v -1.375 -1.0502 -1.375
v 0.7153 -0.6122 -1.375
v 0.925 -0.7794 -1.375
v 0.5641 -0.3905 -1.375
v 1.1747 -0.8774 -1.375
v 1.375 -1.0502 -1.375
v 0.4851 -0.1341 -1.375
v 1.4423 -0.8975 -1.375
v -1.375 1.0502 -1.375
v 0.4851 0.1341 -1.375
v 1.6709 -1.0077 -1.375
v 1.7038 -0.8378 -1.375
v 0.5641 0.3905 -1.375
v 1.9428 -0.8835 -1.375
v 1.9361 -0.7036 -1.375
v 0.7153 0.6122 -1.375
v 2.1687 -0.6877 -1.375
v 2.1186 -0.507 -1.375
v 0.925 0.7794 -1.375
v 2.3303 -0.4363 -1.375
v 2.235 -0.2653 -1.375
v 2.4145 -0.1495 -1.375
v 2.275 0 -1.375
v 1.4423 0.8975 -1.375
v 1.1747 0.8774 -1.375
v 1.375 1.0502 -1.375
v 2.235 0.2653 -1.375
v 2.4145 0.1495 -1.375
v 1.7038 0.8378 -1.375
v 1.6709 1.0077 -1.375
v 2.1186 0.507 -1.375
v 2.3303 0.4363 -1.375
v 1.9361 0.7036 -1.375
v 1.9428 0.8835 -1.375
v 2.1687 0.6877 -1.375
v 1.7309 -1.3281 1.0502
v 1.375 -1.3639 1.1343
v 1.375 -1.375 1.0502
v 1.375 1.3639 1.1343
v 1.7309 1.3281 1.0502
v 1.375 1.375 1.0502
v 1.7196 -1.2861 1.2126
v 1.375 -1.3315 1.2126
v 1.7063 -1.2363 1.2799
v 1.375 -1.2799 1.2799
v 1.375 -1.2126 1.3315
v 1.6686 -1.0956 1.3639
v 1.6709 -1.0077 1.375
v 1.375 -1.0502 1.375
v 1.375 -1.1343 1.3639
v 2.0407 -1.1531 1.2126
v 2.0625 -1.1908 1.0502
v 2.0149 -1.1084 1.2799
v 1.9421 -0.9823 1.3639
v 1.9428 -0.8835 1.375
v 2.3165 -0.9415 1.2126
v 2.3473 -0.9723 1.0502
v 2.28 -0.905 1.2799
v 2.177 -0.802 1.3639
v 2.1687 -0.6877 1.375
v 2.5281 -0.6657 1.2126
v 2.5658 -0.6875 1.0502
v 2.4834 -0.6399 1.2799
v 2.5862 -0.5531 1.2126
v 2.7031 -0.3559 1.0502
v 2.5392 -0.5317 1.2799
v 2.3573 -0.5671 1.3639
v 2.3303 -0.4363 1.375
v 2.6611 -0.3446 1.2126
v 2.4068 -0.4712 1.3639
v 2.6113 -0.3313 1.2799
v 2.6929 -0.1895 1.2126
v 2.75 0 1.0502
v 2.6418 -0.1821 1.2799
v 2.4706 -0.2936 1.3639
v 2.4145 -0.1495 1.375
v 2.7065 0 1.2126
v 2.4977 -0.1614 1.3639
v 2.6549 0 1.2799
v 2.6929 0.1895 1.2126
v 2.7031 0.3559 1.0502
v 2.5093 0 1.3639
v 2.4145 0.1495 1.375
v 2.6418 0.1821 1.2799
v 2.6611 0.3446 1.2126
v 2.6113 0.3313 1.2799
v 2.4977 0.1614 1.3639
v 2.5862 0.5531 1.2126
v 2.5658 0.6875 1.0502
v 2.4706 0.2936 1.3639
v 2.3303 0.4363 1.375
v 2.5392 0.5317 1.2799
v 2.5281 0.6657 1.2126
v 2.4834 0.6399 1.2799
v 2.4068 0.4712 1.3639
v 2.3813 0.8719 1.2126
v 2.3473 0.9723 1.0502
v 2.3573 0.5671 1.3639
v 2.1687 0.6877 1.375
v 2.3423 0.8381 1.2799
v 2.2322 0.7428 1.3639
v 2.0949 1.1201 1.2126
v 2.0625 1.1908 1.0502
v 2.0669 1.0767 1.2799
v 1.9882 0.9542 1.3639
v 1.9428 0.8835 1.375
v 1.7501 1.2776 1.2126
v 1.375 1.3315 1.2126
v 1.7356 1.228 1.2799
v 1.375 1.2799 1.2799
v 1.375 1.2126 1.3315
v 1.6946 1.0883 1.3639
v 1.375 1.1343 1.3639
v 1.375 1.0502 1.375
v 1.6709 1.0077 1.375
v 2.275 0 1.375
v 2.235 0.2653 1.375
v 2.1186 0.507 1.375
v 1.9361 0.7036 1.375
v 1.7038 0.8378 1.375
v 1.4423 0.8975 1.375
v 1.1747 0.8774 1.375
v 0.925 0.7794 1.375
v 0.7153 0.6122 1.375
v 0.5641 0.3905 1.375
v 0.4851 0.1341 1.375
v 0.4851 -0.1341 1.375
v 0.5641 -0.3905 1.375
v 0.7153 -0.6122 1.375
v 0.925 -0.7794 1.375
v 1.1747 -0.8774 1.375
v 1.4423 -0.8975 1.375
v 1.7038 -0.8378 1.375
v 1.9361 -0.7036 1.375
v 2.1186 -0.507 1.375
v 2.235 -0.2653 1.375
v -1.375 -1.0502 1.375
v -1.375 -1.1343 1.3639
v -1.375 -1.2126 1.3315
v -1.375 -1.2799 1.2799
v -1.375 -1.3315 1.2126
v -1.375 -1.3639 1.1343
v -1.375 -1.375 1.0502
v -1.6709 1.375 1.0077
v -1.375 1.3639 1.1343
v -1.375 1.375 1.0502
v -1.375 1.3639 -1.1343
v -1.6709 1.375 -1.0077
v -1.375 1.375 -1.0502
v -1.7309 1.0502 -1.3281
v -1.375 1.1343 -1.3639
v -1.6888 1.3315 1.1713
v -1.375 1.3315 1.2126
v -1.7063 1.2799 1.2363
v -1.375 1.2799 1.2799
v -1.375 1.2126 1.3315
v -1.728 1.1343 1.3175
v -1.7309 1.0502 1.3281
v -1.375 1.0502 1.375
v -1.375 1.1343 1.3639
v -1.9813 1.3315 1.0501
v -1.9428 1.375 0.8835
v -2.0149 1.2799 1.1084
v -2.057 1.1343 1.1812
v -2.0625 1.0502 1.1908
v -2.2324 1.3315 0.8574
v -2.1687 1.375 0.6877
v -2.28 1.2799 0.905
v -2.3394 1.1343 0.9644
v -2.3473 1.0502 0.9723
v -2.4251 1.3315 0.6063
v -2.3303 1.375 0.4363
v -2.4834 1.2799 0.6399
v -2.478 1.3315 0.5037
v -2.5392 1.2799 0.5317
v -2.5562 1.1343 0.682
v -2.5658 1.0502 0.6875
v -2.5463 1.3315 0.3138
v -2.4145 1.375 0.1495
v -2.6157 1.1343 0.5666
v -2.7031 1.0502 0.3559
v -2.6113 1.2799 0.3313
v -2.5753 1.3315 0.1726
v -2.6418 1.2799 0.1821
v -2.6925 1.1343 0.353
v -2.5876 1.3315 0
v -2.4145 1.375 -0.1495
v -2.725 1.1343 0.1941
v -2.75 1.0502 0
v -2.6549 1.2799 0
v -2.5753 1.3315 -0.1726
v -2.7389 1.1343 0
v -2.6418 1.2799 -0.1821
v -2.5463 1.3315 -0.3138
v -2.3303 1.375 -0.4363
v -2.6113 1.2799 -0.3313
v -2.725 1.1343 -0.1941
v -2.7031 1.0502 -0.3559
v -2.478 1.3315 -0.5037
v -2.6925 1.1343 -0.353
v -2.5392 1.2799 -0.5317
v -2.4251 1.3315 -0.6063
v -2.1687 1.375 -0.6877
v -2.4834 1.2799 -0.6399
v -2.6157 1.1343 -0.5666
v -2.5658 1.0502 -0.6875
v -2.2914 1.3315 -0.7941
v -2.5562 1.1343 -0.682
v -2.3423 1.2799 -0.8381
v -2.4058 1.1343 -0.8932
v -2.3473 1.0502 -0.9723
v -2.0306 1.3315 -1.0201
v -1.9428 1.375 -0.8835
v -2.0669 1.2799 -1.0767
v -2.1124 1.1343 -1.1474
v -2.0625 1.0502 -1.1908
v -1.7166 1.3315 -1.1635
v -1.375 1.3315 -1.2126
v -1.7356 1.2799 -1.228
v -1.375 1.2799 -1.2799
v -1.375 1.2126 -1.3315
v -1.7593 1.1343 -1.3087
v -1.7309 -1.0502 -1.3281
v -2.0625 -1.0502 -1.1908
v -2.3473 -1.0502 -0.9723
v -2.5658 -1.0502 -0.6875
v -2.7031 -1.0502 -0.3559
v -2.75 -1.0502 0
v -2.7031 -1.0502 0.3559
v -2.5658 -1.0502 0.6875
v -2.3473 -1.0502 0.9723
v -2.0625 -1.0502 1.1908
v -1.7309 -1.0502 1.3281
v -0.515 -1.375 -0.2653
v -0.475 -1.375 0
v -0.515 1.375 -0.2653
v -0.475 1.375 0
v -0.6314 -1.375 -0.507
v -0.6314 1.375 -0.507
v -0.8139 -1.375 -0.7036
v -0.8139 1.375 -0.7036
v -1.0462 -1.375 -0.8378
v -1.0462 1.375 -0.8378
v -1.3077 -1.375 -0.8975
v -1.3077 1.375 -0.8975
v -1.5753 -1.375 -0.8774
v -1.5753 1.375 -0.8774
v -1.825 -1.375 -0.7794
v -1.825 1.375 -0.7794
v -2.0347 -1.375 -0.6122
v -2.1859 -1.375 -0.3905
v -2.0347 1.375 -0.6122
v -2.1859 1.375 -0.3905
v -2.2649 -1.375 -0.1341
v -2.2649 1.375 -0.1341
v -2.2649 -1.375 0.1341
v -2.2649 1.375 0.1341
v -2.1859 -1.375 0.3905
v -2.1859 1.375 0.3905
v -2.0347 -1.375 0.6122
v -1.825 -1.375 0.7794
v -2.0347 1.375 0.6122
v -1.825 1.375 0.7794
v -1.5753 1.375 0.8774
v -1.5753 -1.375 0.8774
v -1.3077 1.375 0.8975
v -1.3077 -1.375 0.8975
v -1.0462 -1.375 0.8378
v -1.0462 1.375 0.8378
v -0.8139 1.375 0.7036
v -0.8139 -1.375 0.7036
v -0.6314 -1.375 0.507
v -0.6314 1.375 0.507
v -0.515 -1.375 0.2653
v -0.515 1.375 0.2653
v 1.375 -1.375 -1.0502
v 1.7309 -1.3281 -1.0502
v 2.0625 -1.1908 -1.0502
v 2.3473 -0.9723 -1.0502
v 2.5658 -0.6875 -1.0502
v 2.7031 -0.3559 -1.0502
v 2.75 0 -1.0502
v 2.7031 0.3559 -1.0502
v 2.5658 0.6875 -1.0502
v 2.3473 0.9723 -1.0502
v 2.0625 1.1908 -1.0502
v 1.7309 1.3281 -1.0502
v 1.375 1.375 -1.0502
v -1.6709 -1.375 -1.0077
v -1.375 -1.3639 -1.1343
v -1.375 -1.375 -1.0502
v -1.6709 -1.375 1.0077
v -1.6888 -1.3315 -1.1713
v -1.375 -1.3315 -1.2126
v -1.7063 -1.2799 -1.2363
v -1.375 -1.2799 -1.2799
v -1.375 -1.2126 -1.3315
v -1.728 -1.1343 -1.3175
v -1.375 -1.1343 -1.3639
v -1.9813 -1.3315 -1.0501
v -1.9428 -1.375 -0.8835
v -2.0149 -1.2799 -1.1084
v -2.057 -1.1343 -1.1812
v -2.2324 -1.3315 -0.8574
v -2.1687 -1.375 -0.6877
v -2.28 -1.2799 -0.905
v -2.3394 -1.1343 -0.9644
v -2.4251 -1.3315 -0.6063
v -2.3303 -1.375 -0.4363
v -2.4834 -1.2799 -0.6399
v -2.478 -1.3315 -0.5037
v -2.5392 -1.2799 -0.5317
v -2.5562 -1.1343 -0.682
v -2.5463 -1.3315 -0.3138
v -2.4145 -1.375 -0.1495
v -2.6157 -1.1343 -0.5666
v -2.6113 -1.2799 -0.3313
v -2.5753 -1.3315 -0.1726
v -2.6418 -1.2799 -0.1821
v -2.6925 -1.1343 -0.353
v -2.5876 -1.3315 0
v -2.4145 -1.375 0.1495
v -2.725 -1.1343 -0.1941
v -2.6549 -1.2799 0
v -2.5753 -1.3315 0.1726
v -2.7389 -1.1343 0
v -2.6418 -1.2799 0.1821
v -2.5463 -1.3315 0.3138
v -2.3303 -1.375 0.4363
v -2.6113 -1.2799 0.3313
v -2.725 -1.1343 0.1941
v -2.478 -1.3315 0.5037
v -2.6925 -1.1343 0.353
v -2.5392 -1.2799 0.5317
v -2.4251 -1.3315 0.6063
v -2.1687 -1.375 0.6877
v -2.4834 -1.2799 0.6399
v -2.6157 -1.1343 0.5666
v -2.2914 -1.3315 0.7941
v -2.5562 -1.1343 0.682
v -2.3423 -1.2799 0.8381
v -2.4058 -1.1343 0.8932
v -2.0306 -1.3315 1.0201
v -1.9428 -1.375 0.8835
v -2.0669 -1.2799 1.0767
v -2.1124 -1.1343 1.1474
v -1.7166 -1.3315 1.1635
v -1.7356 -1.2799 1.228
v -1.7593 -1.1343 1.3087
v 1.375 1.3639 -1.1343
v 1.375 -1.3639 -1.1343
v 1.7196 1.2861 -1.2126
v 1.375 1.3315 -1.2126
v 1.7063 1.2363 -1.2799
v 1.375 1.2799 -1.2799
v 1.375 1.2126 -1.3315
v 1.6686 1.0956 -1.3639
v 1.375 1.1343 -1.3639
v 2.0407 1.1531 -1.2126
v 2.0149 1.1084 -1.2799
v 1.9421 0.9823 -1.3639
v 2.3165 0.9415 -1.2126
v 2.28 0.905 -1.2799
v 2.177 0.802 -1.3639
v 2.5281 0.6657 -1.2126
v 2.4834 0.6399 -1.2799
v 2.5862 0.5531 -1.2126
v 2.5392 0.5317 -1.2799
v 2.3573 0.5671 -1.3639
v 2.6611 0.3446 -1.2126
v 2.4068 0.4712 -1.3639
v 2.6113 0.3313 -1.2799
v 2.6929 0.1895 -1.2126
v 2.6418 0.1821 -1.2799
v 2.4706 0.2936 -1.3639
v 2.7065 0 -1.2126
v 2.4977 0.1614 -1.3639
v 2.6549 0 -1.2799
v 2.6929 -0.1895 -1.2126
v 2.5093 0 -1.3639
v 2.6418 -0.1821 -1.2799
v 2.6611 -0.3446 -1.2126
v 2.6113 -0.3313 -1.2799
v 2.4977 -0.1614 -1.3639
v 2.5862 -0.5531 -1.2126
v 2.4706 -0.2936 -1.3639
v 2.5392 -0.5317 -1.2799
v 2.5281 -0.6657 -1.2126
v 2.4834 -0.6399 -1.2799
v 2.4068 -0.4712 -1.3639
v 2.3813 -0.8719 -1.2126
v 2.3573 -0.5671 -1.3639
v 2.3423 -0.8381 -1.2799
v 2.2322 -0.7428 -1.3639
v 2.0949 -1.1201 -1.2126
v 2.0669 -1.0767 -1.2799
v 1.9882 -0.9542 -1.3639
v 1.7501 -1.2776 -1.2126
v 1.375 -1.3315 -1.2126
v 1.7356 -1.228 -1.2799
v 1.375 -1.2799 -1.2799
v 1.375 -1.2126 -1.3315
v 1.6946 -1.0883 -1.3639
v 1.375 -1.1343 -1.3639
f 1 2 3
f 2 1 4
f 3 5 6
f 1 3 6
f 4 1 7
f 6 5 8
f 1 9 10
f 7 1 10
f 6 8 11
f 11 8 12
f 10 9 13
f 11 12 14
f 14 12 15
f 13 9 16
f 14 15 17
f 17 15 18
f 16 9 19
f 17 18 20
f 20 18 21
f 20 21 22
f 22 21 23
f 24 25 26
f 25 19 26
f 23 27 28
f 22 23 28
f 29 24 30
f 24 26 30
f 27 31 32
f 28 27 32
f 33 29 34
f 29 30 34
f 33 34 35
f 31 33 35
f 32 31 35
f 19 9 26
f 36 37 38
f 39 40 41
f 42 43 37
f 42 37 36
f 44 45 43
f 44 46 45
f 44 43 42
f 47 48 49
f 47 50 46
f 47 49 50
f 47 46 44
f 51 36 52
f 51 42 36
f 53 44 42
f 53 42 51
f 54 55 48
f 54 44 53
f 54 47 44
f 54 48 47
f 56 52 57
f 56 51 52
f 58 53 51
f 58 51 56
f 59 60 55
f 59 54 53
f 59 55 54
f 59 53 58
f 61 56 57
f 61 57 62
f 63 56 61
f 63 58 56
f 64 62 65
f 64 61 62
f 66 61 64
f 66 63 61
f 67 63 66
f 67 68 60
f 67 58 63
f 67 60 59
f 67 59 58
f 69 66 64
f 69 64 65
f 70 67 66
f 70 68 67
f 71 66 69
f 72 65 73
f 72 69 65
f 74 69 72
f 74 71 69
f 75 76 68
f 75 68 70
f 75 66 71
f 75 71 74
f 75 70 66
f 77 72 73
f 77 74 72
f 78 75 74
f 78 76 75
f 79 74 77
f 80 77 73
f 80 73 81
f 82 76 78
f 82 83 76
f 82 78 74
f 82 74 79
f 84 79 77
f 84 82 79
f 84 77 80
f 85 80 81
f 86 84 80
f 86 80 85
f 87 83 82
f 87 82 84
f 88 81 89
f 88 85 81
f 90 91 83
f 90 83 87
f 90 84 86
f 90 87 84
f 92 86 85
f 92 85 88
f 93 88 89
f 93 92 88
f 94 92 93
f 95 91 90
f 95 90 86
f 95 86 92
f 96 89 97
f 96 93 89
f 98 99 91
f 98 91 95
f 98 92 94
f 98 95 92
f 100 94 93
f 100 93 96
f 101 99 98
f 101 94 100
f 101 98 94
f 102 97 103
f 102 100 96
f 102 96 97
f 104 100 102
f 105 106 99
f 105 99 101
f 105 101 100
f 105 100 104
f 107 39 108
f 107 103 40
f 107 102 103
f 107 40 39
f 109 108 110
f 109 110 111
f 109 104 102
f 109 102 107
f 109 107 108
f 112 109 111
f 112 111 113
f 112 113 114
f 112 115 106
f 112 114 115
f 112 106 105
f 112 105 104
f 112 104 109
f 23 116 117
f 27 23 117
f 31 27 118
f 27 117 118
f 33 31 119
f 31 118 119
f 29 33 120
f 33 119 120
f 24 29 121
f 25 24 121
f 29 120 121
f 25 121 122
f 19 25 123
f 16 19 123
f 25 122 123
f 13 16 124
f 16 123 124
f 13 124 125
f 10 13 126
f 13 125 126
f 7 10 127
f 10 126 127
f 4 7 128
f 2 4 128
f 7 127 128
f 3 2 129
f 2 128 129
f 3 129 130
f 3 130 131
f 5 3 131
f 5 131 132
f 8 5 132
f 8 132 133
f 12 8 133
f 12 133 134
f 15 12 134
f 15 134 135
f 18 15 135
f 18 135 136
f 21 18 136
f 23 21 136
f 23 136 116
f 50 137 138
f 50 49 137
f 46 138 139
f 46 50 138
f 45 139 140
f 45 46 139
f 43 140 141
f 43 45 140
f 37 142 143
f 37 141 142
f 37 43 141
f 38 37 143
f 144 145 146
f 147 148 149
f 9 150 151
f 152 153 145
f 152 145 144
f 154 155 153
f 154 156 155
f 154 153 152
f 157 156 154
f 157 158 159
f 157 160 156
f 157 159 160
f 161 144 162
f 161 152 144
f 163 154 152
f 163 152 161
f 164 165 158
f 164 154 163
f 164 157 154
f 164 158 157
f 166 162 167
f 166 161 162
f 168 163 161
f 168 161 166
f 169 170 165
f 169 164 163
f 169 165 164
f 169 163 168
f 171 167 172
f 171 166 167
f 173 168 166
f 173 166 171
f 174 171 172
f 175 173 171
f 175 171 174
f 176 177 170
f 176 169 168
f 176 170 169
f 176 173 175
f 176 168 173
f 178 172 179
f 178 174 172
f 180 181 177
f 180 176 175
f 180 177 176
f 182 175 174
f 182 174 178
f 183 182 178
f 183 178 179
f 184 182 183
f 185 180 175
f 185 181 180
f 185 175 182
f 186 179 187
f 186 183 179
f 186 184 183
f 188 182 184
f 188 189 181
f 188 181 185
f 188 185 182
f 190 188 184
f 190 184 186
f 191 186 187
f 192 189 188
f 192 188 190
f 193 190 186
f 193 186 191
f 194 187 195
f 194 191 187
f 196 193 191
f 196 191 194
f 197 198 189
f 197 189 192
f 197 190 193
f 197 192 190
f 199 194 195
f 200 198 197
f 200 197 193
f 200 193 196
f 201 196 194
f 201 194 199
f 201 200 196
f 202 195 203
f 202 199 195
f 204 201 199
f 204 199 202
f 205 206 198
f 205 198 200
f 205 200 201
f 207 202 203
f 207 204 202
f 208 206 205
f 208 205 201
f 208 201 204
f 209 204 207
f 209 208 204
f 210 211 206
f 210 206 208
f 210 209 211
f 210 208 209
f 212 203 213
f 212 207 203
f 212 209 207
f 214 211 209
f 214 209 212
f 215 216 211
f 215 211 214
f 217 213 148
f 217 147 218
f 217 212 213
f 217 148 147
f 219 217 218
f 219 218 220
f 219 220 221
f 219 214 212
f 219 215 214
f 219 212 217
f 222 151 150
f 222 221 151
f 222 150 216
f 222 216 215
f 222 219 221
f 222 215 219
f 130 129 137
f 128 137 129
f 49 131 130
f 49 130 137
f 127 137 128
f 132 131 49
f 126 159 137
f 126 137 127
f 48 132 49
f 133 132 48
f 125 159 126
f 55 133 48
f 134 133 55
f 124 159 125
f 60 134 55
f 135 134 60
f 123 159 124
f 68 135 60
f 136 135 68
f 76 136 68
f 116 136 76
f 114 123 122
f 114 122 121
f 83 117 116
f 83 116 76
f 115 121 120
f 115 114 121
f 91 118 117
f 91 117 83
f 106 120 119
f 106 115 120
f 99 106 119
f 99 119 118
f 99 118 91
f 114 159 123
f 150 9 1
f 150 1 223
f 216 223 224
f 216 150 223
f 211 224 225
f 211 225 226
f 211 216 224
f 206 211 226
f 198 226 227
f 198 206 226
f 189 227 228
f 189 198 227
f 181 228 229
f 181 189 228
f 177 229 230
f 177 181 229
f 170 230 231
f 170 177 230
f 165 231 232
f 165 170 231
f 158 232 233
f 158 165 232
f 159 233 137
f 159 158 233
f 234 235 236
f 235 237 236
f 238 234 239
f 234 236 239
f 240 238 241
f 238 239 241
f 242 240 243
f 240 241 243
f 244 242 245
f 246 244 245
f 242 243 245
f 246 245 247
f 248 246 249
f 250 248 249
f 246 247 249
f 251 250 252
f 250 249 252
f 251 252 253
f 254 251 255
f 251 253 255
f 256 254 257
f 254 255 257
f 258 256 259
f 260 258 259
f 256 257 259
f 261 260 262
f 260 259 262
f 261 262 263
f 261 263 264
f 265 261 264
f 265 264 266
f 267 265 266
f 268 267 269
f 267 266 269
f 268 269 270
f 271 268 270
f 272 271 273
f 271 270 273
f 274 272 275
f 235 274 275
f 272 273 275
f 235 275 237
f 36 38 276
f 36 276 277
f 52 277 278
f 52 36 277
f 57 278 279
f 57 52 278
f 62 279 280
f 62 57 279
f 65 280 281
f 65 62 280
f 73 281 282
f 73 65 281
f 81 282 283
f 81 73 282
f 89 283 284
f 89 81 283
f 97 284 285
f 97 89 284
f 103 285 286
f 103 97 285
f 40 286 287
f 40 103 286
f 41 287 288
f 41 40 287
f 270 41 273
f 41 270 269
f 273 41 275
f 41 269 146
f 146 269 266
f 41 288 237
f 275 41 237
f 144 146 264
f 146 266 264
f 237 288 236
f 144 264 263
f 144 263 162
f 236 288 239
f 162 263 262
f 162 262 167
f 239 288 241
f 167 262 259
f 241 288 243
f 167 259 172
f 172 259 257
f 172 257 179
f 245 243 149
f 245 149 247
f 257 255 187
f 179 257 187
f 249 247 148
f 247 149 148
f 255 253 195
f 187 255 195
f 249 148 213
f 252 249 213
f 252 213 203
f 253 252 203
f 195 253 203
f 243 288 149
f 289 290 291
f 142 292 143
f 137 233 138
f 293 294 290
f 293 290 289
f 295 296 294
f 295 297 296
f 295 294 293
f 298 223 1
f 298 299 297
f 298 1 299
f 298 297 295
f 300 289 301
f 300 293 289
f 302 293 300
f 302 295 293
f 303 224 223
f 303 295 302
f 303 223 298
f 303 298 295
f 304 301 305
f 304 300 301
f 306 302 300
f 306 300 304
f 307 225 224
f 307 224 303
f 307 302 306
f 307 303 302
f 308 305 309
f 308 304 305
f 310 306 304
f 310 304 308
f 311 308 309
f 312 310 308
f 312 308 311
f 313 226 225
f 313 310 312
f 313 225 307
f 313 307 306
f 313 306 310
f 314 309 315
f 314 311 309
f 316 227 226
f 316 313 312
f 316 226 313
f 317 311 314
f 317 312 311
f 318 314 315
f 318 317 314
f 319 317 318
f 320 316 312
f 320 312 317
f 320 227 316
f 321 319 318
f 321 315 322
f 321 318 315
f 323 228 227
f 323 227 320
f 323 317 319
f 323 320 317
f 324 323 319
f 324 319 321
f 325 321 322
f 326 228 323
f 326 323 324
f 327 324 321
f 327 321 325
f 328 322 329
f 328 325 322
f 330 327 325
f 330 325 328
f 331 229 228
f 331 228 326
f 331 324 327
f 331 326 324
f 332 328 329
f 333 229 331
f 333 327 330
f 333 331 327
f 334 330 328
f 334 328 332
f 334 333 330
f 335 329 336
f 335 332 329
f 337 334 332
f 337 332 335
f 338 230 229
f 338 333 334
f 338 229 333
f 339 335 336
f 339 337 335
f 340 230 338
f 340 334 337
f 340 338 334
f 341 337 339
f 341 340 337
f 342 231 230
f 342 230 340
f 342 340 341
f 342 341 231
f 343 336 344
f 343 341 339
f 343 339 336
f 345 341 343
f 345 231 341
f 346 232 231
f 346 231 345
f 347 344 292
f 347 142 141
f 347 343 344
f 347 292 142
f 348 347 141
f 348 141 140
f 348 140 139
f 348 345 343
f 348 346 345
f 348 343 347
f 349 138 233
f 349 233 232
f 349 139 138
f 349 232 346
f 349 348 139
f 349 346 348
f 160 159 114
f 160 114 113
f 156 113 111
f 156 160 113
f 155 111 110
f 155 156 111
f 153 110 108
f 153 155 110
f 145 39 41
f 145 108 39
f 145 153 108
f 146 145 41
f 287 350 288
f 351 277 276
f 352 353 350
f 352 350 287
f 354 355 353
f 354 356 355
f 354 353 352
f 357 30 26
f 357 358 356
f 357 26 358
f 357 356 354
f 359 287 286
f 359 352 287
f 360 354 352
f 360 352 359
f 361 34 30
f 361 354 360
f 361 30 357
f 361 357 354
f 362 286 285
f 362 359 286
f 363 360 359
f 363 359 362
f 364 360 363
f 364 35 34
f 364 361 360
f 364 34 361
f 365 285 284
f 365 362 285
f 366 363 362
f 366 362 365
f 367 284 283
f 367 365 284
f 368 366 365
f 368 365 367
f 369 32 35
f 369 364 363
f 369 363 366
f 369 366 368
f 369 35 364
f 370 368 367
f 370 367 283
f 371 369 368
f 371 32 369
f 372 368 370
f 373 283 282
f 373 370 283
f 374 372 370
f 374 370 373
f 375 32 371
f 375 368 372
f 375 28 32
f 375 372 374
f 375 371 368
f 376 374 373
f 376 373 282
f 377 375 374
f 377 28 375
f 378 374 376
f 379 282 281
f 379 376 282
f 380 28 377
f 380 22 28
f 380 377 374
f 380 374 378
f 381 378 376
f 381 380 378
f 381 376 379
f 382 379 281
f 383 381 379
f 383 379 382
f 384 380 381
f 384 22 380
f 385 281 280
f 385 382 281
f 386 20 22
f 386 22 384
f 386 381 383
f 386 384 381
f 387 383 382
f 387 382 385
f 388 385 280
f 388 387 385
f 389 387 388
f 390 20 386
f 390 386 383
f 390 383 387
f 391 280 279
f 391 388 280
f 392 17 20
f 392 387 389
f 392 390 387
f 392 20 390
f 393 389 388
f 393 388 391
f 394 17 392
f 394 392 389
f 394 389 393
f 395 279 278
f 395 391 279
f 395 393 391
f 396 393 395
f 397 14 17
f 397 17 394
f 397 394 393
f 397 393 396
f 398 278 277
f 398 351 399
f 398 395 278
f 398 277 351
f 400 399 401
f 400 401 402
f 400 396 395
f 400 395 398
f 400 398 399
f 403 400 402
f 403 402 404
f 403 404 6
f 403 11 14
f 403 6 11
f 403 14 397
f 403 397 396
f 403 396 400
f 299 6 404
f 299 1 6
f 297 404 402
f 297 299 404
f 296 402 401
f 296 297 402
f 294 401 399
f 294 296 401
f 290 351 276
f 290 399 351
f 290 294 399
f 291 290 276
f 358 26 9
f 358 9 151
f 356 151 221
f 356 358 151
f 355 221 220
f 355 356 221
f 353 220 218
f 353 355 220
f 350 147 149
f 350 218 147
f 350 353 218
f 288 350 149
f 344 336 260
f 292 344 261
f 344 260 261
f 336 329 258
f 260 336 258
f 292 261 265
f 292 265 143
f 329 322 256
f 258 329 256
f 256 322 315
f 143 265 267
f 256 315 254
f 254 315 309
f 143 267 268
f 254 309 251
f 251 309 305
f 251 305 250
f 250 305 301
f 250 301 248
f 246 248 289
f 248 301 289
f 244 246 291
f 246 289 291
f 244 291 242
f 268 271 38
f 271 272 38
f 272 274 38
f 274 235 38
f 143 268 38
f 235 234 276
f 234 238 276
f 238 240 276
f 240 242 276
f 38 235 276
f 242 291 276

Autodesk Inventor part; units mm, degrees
ref_plane "YZ Plane" through (0, 0, 0) normal (1, 0, 0) x (0, 1, 0)
ref_plane "XZ Plane" through (0, 0, 0) normal (0, 1, 0) x (-1, 0, 0)
ref_plane "XY Plane" through (0, 0, 0) normal (0, 0, 1) x (1, 0, 0)
sketch "Sketch1" plane through (0, 0, 0) normal (0, 0, 1) x (1, 0, 0)
  line L0 (-2.75, -1.375) -> (2.75, -1.375)
  line L1 (2.75, -1.375) -> (2.75, 1.375)
  line L2 (2.75, 1.375) -> (-2.75, 1.375)
  line L3 (-2.75, 1.375) -> (-2.75, -1.375)
  line L4 (-2.75, -1.375) -> (2.75, 1.375) construction
  line L5 (2.75, -1.375) -> (-2.75, 1.375) construction
  point P0 (0, 0)
  dimension "d0" = 5.5
  dimension "d1" = 2.75
extrude "Extrusion1" add sketch "Sketch1" along normal mid plane 2.75
sketch "Sketch2" plane through (0, 0, 1.375) normal (0, 0, 1) x (1, 0, 0)
  circle A0 centre (1.375, 0) radius 1.375
  line L0 (2.75, 1.375) -> (-2.75, 1.375) projected
  line L1 (2.75, -1.375) -> (2.75, 1.375) projected
  line L2 (1.375, 0) -> (1.375, 1.375)
  line L3 (1.375, 1.375) -> (2.75, 1.375)
  line L4 (2.75, 1.375) -> (2.75, -1.375)
  line L5 (-2.75, -1.375) -> (2.75, -1.375) projected
  line L6 (2.75, -1.375) -> (1.375, -1.375)
  circle A1 centre (1.375, 0) radius 0.9
  point P0 (0, 0)
  point P1 (2.75, 0)
  dimension "d4" = 1.8
extrude "Extrusion2" cut sketch "Sketch2" against normal through all contours A1 | L1 L5 A0 | A0 L0 L1
sketch "Sketch3" plane through (-2.75, 1.375, 1.375) normal (0, 1, 0) x (1, 0, 0)
  line L0 (0, 2.75) -> (0, 0) projected
  line L1 (0, 1.375) -> (4.125, 1.375)
  line L2 (4.125, 2.75) -> (4.125, 0) projected
  circle A0 centre (1.375, 1.375) radius 1.375
  line L3 (0, 2.75) -> (4.125, 2.75) projected
  line L4 (0, 0) -> (0, 2.75) projected
  circle A1 centre (1.375, 1.375) radius 0.9
  line L5 (1.375, 1.375) -> (1.375, 0)
  line L6 (0, 0) -> (4.125, 0) projected
  line L7 (1.375, 0) -> (0, 0)
  line L8 (0, 0) -> (0, 2.75)
  line L9 (0, 2.75) -> (1.375, 2.75)
  point P0 (2.75, 1.375)
  dimension "d7" = 1.8
extrude "Extrusion3" cut sketch "Sketch3" against normal blind 2.75 contours L3 A0 L0 | A0 L6 L0 | A1 L1 | L1 L5 A1 | L1 A1 L5
fillet "Fillet1" radius 0.3248 8 edges at (0, 1.375, 1.375) (2.75, 0, 1.375) (0, -1.375, 1.375) (-2.75, -1.375, 0) (0, -1.375, -1.375) (2.75, 0, -1.375) (0, 1.375, -1.375) (-2.75, 1.375, 0)
properties part number "KNUCKLE_Dedao"
